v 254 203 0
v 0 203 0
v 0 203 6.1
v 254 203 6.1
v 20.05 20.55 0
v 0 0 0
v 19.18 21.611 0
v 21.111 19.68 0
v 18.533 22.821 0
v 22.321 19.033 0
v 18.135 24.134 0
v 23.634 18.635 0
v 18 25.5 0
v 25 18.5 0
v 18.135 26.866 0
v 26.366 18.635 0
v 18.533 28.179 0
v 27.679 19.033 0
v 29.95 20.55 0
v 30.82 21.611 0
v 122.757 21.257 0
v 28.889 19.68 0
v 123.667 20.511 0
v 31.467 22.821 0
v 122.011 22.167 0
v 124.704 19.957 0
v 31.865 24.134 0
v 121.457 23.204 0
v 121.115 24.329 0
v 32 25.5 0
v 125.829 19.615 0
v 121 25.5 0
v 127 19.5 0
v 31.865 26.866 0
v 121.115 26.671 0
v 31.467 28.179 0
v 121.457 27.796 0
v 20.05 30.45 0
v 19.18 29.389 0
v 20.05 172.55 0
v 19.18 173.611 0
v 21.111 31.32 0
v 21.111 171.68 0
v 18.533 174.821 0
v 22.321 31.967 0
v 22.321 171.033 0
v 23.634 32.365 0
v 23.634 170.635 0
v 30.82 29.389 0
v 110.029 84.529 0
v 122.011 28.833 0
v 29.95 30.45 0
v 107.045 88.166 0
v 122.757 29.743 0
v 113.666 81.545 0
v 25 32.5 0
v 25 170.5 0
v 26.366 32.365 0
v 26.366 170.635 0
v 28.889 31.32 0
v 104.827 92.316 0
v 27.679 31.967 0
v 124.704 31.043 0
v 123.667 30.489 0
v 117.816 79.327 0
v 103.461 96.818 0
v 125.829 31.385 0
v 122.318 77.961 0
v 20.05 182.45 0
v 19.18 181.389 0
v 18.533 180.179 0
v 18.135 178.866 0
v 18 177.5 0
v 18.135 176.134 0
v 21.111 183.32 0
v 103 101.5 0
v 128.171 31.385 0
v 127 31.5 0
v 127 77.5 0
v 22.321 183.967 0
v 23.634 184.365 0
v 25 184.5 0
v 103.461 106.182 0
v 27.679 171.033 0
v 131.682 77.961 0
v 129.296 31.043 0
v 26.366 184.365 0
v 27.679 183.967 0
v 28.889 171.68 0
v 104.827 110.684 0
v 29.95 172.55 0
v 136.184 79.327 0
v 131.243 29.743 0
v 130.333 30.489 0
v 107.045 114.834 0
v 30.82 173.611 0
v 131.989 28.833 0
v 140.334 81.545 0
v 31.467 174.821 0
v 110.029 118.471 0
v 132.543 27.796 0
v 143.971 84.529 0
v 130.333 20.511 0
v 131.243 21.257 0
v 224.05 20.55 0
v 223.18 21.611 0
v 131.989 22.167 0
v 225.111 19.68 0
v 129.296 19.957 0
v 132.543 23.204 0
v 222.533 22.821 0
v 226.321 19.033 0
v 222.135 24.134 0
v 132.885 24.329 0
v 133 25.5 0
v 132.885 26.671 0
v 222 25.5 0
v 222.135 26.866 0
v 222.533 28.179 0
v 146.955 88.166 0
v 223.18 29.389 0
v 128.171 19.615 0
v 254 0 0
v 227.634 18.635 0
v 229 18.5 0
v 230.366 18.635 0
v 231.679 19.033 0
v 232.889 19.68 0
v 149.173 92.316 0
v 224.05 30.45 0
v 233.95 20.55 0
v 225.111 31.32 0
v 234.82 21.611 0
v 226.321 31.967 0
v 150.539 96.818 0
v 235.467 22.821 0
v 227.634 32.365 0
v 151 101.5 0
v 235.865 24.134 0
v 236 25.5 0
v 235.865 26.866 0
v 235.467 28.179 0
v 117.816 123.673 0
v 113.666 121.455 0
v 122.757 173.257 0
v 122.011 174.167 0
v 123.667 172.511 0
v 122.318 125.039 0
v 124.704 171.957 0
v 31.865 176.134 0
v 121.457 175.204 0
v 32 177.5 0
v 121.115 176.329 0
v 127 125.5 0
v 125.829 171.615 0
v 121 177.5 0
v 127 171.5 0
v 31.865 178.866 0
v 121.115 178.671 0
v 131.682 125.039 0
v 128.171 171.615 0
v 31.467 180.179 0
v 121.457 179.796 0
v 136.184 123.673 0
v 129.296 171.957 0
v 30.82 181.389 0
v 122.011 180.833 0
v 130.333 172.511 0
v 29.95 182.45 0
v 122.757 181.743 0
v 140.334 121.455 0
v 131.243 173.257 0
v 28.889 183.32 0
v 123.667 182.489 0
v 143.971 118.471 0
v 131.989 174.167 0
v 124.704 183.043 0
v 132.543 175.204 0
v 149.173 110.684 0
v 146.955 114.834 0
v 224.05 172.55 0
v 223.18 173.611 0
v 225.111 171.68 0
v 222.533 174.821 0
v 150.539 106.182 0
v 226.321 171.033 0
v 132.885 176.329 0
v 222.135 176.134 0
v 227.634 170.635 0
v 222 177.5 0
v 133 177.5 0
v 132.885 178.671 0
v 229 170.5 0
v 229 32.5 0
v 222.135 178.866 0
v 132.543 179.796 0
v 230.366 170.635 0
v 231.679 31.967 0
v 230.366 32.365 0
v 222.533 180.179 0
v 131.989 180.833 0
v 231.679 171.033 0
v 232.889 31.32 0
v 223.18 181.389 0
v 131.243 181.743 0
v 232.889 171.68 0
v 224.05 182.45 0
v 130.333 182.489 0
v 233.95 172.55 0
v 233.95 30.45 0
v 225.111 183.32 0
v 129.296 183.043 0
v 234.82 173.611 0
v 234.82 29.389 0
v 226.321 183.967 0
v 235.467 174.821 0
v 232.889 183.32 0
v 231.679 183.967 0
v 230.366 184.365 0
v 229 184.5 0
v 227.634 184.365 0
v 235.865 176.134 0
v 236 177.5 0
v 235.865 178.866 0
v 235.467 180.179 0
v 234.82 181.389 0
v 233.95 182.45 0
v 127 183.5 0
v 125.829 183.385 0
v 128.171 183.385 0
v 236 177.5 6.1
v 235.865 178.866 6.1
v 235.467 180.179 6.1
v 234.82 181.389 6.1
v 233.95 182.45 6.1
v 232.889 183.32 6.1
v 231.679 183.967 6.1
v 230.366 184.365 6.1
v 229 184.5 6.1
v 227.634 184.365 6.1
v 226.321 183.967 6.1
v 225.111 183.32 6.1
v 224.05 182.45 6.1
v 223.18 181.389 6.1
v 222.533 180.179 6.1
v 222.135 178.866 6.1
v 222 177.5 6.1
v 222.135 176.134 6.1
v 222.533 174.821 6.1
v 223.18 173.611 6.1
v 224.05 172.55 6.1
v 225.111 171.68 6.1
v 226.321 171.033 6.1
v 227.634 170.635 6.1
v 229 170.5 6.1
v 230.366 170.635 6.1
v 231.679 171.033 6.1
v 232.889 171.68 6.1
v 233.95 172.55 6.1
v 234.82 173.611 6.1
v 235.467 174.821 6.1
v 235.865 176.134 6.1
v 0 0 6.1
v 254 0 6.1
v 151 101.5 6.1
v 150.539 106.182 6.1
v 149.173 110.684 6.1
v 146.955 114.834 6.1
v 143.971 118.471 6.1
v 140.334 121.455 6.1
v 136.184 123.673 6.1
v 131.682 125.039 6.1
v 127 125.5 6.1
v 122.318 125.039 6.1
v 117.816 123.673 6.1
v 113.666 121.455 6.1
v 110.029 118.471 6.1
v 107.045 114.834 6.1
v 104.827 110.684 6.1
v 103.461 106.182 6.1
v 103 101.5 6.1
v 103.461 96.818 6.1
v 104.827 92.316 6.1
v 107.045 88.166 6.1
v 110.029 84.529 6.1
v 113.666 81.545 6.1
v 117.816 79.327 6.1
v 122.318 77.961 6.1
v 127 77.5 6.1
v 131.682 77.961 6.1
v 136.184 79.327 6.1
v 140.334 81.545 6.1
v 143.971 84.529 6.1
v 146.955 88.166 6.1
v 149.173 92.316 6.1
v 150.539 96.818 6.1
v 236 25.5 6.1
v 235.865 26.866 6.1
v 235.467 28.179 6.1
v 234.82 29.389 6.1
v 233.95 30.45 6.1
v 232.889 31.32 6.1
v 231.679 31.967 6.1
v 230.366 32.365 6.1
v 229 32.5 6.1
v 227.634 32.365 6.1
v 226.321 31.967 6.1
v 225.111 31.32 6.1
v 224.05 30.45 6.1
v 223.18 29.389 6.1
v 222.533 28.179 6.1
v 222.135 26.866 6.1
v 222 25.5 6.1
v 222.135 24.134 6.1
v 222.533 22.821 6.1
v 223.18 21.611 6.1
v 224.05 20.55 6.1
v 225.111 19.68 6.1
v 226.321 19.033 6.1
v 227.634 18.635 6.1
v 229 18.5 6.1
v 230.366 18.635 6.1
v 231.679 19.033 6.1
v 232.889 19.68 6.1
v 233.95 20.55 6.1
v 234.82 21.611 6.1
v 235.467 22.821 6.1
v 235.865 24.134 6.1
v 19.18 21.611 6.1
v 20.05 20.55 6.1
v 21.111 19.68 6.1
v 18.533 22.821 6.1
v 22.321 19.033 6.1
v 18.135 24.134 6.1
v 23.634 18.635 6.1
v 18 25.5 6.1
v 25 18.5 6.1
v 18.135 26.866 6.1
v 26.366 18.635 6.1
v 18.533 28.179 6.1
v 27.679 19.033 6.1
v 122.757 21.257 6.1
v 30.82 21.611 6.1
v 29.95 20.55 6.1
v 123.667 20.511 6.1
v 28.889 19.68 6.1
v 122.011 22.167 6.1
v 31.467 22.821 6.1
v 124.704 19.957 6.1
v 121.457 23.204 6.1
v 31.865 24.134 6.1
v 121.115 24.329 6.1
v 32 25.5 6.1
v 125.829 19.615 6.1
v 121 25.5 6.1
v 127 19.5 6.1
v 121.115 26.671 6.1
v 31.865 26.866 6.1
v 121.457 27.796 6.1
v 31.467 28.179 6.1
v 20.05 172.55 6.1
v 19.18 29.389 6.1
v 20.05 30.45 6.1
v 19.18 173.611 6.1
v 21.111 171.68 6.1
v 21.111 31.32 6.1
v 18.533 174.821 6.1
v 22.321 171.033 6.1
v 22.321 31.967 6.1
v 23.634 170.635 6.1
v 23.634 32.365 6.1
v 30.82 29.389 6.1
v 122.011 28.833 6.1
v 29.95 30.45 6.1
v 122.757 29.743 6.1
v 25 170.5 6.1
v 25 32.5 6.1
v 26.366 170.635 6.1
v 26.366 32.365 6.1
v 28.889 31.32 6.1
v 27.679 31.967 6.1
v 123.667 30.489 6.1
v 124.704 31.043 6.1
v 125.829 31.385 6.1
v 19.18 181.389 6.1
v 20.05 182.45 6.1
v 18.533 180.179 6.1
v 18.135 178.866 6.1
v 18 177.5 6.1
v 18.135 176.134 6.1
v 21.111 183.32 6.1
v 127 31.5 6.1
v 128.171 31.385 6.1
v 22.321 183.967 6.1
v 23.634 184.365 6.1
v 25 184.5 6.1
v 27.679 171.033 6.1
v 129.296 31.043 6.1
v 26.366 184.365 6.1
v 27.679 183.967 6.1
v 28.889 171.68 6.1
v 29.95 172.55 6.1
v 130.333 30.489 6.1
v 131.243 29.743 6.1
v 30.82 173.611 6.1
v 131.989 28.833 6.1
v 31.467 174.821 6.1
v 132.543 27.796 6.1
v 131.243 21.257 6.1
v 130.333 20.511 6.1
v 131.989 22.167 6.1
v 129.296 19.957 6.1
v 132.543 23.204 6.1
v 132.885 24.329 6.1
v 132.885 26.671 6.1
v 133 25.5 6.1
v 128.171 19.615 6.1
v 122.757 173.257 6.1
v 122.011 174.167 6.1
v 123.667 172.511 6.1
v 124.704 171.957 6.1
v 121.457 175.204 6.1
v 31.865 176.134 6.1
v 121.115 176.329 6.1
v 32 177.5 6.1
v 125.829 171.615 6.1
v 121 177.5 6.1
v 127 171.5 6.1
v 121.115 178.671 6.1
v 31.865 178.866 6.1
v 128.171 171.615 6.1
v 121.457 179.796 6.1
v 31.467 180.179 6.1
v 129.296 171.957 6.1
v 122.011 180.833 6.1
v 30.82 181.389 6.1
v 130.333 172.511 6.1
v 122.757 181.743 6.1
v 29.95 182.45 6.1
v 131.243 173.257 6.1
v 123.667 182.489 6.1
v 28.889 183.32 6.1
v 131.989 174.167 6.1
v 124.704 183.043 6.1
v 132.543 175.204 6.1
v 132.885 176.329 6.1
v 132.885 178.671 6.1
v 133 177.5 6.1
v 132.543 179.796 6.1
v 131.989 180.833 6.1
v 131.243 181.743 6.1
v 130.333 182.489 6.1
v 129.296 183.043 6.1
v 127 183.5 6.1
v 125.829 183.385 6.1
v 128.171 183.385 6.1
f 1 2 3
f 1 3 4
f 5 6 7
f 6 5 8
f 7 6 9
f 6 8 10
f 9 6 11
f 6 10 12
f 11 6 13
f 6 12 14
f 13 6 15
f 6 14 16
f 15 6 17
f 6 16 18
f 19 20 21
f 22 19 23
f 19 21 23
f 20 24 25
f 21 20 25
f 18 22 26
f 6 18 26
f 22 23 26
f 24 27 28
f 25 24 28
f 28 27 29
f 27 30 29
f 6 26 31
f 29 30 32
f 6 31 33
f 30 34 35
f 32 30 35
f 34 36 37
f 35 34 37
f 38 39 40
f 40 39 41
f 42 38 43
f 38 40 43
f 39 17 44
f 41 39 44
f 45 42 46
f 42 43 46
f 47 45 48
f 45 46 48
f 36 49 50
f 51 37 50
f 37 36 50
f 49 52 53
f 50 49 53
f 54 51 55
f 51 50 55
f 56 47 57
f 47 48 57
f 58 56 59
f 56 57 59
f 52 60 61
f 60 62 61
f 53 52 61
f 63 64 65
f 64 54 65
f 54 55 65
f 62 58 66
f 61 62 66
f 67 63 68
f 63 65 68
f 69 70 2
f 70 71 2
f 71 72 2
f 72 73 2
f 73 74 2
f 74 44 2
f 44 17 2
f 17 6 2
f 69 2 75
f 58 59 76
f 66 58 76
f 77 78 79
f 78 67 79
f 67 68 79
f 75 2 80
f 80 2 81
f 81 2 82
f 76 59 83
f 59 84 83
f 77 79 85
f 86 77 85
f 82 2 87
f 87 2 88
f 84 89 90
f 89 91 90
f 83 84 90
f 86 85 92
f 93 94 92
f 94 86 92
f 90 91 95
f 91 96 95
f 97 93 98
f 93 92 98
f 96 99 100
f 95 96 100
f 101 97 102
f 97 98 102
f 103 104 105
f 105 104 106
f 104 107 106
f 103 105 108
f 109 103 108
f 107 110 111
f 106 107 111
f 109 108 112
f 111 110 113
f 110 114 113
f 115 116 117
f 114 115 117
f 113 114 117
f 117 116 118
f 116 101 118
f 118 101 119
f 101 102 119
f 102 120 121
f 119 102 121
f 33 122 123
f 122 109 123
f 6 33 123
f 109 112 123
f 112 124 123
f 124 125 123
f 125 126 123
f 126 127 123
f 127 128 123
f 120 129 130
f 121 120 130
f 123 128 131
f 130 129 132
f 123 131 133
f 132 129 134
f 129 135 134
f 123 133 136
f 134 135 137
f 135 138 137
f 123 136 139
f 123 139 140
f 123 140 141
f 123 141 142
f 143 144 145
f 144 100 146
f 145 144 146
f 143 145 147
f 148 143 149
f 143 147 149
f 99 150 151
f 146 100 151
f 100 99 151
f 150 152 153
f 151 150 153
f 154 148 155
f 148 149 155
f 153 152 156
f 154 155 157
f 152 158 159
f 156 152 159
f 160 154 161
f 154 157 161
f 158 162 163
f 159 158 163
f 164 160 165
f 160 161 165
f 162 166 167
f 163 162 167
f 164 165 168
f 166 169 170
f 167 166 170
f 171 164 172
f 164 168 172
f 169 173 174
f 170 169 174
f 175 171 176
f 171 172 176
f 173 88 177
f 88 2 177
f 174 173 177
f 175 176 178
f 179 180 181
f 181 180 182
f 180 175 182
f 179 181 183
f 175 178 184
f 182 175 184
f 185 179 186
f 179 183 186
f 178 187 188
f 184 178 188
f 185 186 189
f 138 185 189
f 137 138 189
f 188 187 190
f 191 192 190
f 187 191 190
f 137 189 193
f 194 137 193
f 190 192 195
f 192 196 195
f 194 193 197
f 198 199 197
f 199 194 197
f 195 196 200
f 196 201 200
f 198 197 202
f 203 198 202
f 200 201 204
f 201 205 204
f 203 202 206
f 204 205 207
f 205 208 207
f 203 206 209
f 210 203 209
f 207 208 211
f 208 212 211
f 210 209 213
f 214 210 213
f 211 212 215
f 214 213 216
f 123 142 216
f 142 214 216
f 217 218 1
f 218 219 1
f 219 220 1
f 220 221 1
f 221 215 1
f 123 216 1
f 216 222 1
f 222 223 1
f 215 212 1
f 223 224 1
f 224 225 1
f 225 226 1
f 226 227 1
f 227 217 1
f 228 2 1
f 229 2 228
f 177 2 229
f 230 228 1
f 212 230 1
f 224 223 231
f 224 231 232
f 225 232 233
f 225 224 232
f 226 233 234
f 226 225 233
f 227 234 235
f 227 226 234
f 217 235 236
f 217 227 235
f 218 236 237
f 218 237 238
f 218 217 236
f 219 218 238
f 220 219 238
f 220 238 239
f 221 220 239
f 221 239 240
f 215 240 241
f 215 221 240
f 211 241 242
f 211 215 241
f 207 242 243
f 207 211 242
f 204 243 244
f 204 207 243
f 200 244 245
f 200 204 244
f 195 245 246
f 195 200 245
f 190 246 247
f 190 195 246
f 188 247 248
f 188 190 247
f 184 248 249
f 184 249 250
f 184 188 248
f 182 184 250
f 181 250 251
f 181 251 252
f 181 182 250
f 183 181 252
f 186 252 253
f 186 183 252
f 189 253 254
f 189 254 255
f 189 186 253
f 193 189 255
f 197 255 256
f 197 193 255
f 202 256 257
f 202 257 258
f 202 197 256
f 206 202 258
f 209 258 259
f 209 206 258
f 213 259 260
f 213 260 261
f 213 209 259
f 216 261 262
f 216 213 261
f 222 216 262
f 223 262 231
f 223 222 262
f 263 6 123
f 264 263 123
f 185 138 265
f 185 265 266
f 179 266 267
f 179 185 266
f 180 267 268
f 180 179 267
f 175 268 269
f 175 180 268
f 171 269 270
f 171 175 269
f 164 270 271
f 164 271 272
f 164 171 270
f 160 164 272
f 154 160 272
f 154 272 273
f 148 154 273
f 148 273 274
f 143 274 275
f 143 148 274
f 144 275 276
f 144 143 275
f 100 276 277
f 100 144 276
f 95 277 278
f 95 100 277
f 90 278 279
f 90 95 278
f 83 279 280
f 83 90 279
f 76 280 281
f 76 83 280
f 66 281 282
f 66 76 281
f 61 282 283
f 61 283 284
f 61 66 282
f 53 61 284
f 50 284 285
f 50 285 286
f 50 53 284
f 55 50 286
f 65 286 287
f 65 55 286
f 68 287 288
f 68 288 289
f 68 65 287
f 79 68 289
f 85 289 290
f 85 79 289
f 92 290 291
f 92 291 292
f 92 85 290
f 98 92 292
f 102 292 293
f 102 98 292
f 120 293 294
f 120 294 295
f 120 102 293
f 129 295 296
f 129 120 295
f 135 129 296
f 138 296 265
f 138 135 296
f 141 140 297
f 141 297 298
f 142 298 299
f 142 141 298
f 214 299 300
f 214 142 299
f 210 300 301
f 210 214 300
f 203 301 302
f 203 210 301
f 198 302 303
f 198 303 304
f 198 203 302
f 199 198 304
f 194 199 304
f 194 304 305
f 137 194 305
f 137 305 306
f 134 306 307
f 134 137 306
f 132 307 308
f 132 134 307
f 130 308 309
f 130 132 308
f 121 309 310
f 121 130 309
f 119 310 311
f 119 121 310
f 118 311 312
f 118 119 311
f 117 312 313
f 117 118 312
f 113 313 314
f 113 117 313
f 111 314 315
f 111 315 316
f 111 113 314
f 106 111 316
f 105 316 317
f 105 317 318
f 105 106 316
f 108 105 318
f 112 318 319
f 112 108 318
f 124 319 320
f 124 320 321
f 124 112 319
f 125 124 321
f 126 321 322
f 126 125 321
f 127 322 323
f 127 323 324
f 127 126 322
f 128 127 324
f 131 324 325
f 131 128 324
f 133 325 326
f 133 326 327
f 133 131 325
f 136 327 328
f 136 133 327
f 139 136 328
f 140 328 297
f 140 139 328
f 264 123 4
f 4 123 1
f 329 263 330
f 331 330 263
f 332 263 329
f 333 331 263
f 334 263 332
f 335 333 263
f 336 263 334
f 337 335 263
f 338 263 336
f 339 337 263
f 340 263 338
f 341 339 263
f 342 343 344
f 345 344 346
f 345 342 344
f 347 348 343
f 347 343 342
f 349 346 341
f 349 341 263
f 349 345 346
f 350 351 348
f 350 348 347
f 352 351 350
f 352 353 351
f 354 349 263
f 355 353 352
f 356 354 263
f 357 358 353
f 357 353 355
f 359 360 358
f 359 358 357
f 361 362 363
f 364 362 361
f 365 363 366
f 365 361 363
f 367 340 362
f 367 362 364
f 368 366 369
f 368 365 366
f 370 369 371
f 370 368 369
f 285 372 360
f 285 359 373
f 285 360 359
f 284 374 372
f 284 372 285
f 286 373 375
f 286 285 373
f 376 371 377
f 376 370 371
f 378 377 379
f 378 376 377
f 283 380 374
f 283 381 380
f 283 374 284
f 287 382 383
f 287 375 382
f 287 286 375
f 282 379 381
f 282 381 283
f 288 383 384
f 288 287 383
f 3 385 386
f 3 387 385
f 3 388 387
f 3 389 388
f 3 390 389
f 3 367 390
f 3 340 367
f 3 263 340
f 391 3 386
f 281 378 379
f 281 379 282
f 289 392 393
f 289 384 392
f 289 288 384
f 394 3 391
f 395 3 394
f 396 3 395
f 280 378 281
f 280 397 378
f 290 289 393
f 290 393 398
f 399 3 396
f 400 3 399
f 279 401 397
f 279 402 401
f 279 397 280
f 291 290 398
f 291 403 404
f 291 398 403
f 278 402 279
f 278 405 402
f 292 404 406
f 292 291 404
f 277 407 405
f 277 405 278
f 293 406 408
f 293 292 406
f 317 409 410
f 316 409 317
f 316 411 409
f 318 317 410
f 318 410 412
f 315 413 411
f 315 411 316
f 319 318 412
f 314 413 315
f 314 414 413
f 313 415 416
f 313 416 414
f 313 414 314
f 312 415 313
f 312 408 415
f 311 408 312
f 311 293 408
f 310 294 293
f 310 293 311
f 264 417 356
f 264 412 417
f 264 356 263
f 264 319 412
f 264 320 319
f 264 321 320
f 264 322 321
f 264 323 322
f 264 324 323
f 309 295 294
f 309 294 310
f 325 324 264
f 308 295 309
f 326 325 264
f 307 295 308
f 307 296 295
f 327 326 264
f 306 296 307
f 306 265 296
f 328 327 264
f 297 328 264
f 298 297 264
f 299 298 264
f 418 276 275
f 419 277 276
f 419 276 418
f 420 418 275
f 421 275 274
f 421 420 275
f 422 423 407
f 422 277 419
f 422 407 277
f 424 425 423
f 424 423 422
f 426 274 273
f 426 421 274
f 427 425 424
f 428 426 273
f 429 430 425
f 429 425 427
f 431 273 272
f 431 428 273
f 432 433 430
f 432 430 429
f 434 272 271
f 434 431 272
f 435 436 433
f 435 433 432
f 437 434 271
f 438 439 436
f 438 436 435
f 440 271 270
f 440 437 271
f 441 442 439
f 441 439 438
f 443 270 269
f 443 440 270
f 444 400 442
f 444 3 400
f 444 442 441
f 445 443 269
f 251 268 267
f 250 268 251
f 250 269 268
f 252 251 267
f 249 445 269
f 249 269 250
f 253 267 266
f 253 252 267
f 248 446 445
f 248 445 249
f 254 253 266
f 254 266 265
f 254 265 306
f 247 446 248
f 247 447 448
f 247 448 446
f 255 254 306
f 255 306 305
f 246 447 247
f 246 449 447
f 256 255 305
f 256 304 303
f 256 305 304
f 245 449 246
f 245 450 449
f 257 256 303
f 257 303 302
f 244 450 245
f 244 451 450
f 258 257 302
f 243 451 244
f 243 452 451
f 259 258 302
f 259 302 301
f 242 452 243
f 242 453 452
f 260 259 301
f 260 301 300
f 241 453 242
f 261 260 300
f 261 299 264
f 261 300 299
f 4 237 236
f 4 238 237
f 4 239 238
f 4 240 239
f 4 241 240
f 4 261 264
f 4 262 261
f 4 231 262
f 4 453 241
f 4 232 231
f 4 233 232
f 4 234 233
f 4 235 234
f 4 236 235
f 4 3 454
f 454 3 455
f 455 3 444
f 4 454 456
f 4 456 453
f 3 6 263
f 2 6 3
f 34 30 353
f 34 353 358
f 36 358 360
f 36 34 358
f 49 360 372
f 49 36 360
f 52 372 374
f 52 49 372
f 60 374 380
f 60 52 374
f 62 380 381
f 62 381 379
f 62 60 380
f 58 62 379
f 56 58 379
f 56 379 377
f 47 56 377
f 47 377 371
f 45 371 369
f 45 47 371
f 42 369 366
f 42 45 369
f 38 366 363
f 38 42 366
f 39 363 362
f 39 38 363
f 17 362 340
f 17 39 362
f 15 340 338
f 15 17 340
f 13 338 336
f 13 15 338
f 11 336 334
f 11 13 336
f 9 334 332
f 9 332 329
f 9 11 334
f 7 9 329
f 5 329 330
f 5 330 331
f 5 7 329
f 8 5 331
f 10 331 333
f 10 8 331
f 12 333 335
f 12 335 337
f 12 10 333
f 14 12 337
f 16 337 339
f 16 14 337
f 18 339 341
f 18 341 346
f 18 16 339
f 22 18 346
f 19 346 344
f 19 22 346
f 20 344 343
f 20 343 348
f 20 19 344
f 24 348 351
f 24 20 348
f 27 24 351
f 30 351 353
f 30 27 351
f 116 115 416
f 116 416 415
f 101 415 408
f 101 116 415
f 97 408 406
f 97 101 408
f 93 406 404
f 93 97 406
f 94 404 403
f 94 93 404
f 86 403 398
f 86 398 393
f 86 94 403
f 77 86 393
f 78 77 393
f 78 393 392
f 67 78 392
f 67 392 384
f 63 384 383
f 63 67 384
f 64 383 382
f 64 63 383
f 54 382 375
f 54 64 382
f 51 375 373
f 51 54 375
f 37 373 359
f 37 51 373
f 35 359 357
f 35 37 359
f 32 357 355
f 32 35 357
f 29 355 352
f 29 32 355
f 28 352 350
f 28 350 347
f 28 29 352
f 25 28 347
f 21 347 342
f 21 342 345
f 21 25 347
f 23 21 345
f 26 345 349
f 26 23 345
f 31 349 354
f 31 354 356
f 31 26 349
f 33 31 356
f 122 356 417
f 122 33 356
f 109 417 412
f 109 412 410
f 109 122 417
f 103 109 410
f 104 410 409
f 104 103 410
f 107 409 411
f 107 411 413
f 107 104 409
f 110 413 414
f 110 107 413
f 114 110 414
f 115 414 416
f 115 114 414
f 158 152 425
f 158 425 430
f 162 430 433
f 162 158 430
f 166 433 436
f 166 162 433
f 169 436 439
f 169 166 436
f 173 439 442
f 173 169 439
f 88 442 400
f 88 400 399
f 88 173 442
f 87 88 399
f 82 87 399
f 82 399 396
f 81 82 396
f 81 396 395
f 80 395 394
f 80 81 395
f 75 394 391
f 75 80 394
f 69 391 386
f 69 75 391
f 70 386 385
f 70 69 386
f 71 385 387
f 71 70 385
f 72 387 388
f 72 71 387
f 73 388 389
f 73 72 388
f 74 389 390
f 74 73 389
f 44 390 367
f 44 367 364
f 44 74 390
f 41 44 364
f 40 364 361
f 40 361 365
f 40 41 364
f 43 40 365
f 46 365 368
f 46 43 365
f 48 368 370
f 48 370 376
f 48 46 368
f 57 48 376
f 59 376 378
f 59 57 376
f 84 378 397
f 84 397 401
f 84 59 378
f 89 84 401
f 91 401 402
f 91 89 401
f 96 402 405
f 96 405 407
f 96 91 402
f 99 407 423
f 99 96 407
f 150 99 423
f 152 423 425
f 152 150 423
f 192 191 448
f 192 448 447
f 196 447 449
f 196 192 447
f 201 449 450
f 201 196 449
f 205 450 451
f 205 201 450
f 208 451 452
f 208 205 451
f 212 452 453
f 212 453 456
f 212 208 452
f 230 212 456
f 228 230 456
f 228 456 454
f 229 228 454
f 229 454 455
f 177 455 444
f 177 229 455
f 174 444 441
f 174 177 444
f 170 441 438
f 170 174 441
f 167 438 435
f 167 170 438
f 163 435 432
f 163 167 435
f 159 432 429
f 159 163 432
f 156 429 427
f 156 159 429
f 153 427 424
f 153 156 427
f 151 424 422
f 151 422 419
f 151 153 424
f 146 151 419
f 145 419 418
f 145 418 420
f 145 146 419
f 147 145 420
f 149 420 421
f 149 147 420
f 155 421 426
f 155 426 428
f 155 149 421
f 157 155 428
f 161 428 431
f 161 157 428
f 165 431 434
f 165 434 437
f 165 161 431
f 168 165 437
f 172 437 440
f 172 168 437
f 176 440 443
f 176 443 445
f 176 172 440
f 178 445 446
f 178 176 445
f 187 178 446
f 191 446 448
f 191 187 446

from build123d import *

# Parameters (mm, degrees)
F0_W     = 254
F0_H     = 203
F0_R     = 7
F0_R_2   = 6
F0_R_3   = 24
F1_DEPTH = 6.1


with BuildPart() as f1:
    # F0 (on Top) → F1 (new body)
    with BuildSketch(Plane.XY):
        with Locations((127, 101.5)):
            Rectangle(F0_W, F0_H)
        with Locations((25, 25.5)):
            Circle(F0_R, mode=Mode.SUBTRACT)
        with Locations((127, 25.5)):
            Circle(F0_R_2, mode=Mode.SUBTRACT)
        with Locations((229, 25.5)):
            Circle(F0_R, mode=Mode.SUBTRACT)
        with Locations((25, 177.5)):
            Circle(F0_R, mode=Mode.SUBTRACT)
        with Locations((127, 101.5)):
            Circle(F0_R_3, mode=Mode.SUBTRACT)
        with Locations((127, 177.5)):
            Circle(F0_R_2, mode=Mode.SUBTRACT)
        with Locations((229, 177.5)):
            Circle(F0_R, mode=Mode.SUBTRACT)
    extrude(amount=F1_DEPTH)


solid = f1.part
